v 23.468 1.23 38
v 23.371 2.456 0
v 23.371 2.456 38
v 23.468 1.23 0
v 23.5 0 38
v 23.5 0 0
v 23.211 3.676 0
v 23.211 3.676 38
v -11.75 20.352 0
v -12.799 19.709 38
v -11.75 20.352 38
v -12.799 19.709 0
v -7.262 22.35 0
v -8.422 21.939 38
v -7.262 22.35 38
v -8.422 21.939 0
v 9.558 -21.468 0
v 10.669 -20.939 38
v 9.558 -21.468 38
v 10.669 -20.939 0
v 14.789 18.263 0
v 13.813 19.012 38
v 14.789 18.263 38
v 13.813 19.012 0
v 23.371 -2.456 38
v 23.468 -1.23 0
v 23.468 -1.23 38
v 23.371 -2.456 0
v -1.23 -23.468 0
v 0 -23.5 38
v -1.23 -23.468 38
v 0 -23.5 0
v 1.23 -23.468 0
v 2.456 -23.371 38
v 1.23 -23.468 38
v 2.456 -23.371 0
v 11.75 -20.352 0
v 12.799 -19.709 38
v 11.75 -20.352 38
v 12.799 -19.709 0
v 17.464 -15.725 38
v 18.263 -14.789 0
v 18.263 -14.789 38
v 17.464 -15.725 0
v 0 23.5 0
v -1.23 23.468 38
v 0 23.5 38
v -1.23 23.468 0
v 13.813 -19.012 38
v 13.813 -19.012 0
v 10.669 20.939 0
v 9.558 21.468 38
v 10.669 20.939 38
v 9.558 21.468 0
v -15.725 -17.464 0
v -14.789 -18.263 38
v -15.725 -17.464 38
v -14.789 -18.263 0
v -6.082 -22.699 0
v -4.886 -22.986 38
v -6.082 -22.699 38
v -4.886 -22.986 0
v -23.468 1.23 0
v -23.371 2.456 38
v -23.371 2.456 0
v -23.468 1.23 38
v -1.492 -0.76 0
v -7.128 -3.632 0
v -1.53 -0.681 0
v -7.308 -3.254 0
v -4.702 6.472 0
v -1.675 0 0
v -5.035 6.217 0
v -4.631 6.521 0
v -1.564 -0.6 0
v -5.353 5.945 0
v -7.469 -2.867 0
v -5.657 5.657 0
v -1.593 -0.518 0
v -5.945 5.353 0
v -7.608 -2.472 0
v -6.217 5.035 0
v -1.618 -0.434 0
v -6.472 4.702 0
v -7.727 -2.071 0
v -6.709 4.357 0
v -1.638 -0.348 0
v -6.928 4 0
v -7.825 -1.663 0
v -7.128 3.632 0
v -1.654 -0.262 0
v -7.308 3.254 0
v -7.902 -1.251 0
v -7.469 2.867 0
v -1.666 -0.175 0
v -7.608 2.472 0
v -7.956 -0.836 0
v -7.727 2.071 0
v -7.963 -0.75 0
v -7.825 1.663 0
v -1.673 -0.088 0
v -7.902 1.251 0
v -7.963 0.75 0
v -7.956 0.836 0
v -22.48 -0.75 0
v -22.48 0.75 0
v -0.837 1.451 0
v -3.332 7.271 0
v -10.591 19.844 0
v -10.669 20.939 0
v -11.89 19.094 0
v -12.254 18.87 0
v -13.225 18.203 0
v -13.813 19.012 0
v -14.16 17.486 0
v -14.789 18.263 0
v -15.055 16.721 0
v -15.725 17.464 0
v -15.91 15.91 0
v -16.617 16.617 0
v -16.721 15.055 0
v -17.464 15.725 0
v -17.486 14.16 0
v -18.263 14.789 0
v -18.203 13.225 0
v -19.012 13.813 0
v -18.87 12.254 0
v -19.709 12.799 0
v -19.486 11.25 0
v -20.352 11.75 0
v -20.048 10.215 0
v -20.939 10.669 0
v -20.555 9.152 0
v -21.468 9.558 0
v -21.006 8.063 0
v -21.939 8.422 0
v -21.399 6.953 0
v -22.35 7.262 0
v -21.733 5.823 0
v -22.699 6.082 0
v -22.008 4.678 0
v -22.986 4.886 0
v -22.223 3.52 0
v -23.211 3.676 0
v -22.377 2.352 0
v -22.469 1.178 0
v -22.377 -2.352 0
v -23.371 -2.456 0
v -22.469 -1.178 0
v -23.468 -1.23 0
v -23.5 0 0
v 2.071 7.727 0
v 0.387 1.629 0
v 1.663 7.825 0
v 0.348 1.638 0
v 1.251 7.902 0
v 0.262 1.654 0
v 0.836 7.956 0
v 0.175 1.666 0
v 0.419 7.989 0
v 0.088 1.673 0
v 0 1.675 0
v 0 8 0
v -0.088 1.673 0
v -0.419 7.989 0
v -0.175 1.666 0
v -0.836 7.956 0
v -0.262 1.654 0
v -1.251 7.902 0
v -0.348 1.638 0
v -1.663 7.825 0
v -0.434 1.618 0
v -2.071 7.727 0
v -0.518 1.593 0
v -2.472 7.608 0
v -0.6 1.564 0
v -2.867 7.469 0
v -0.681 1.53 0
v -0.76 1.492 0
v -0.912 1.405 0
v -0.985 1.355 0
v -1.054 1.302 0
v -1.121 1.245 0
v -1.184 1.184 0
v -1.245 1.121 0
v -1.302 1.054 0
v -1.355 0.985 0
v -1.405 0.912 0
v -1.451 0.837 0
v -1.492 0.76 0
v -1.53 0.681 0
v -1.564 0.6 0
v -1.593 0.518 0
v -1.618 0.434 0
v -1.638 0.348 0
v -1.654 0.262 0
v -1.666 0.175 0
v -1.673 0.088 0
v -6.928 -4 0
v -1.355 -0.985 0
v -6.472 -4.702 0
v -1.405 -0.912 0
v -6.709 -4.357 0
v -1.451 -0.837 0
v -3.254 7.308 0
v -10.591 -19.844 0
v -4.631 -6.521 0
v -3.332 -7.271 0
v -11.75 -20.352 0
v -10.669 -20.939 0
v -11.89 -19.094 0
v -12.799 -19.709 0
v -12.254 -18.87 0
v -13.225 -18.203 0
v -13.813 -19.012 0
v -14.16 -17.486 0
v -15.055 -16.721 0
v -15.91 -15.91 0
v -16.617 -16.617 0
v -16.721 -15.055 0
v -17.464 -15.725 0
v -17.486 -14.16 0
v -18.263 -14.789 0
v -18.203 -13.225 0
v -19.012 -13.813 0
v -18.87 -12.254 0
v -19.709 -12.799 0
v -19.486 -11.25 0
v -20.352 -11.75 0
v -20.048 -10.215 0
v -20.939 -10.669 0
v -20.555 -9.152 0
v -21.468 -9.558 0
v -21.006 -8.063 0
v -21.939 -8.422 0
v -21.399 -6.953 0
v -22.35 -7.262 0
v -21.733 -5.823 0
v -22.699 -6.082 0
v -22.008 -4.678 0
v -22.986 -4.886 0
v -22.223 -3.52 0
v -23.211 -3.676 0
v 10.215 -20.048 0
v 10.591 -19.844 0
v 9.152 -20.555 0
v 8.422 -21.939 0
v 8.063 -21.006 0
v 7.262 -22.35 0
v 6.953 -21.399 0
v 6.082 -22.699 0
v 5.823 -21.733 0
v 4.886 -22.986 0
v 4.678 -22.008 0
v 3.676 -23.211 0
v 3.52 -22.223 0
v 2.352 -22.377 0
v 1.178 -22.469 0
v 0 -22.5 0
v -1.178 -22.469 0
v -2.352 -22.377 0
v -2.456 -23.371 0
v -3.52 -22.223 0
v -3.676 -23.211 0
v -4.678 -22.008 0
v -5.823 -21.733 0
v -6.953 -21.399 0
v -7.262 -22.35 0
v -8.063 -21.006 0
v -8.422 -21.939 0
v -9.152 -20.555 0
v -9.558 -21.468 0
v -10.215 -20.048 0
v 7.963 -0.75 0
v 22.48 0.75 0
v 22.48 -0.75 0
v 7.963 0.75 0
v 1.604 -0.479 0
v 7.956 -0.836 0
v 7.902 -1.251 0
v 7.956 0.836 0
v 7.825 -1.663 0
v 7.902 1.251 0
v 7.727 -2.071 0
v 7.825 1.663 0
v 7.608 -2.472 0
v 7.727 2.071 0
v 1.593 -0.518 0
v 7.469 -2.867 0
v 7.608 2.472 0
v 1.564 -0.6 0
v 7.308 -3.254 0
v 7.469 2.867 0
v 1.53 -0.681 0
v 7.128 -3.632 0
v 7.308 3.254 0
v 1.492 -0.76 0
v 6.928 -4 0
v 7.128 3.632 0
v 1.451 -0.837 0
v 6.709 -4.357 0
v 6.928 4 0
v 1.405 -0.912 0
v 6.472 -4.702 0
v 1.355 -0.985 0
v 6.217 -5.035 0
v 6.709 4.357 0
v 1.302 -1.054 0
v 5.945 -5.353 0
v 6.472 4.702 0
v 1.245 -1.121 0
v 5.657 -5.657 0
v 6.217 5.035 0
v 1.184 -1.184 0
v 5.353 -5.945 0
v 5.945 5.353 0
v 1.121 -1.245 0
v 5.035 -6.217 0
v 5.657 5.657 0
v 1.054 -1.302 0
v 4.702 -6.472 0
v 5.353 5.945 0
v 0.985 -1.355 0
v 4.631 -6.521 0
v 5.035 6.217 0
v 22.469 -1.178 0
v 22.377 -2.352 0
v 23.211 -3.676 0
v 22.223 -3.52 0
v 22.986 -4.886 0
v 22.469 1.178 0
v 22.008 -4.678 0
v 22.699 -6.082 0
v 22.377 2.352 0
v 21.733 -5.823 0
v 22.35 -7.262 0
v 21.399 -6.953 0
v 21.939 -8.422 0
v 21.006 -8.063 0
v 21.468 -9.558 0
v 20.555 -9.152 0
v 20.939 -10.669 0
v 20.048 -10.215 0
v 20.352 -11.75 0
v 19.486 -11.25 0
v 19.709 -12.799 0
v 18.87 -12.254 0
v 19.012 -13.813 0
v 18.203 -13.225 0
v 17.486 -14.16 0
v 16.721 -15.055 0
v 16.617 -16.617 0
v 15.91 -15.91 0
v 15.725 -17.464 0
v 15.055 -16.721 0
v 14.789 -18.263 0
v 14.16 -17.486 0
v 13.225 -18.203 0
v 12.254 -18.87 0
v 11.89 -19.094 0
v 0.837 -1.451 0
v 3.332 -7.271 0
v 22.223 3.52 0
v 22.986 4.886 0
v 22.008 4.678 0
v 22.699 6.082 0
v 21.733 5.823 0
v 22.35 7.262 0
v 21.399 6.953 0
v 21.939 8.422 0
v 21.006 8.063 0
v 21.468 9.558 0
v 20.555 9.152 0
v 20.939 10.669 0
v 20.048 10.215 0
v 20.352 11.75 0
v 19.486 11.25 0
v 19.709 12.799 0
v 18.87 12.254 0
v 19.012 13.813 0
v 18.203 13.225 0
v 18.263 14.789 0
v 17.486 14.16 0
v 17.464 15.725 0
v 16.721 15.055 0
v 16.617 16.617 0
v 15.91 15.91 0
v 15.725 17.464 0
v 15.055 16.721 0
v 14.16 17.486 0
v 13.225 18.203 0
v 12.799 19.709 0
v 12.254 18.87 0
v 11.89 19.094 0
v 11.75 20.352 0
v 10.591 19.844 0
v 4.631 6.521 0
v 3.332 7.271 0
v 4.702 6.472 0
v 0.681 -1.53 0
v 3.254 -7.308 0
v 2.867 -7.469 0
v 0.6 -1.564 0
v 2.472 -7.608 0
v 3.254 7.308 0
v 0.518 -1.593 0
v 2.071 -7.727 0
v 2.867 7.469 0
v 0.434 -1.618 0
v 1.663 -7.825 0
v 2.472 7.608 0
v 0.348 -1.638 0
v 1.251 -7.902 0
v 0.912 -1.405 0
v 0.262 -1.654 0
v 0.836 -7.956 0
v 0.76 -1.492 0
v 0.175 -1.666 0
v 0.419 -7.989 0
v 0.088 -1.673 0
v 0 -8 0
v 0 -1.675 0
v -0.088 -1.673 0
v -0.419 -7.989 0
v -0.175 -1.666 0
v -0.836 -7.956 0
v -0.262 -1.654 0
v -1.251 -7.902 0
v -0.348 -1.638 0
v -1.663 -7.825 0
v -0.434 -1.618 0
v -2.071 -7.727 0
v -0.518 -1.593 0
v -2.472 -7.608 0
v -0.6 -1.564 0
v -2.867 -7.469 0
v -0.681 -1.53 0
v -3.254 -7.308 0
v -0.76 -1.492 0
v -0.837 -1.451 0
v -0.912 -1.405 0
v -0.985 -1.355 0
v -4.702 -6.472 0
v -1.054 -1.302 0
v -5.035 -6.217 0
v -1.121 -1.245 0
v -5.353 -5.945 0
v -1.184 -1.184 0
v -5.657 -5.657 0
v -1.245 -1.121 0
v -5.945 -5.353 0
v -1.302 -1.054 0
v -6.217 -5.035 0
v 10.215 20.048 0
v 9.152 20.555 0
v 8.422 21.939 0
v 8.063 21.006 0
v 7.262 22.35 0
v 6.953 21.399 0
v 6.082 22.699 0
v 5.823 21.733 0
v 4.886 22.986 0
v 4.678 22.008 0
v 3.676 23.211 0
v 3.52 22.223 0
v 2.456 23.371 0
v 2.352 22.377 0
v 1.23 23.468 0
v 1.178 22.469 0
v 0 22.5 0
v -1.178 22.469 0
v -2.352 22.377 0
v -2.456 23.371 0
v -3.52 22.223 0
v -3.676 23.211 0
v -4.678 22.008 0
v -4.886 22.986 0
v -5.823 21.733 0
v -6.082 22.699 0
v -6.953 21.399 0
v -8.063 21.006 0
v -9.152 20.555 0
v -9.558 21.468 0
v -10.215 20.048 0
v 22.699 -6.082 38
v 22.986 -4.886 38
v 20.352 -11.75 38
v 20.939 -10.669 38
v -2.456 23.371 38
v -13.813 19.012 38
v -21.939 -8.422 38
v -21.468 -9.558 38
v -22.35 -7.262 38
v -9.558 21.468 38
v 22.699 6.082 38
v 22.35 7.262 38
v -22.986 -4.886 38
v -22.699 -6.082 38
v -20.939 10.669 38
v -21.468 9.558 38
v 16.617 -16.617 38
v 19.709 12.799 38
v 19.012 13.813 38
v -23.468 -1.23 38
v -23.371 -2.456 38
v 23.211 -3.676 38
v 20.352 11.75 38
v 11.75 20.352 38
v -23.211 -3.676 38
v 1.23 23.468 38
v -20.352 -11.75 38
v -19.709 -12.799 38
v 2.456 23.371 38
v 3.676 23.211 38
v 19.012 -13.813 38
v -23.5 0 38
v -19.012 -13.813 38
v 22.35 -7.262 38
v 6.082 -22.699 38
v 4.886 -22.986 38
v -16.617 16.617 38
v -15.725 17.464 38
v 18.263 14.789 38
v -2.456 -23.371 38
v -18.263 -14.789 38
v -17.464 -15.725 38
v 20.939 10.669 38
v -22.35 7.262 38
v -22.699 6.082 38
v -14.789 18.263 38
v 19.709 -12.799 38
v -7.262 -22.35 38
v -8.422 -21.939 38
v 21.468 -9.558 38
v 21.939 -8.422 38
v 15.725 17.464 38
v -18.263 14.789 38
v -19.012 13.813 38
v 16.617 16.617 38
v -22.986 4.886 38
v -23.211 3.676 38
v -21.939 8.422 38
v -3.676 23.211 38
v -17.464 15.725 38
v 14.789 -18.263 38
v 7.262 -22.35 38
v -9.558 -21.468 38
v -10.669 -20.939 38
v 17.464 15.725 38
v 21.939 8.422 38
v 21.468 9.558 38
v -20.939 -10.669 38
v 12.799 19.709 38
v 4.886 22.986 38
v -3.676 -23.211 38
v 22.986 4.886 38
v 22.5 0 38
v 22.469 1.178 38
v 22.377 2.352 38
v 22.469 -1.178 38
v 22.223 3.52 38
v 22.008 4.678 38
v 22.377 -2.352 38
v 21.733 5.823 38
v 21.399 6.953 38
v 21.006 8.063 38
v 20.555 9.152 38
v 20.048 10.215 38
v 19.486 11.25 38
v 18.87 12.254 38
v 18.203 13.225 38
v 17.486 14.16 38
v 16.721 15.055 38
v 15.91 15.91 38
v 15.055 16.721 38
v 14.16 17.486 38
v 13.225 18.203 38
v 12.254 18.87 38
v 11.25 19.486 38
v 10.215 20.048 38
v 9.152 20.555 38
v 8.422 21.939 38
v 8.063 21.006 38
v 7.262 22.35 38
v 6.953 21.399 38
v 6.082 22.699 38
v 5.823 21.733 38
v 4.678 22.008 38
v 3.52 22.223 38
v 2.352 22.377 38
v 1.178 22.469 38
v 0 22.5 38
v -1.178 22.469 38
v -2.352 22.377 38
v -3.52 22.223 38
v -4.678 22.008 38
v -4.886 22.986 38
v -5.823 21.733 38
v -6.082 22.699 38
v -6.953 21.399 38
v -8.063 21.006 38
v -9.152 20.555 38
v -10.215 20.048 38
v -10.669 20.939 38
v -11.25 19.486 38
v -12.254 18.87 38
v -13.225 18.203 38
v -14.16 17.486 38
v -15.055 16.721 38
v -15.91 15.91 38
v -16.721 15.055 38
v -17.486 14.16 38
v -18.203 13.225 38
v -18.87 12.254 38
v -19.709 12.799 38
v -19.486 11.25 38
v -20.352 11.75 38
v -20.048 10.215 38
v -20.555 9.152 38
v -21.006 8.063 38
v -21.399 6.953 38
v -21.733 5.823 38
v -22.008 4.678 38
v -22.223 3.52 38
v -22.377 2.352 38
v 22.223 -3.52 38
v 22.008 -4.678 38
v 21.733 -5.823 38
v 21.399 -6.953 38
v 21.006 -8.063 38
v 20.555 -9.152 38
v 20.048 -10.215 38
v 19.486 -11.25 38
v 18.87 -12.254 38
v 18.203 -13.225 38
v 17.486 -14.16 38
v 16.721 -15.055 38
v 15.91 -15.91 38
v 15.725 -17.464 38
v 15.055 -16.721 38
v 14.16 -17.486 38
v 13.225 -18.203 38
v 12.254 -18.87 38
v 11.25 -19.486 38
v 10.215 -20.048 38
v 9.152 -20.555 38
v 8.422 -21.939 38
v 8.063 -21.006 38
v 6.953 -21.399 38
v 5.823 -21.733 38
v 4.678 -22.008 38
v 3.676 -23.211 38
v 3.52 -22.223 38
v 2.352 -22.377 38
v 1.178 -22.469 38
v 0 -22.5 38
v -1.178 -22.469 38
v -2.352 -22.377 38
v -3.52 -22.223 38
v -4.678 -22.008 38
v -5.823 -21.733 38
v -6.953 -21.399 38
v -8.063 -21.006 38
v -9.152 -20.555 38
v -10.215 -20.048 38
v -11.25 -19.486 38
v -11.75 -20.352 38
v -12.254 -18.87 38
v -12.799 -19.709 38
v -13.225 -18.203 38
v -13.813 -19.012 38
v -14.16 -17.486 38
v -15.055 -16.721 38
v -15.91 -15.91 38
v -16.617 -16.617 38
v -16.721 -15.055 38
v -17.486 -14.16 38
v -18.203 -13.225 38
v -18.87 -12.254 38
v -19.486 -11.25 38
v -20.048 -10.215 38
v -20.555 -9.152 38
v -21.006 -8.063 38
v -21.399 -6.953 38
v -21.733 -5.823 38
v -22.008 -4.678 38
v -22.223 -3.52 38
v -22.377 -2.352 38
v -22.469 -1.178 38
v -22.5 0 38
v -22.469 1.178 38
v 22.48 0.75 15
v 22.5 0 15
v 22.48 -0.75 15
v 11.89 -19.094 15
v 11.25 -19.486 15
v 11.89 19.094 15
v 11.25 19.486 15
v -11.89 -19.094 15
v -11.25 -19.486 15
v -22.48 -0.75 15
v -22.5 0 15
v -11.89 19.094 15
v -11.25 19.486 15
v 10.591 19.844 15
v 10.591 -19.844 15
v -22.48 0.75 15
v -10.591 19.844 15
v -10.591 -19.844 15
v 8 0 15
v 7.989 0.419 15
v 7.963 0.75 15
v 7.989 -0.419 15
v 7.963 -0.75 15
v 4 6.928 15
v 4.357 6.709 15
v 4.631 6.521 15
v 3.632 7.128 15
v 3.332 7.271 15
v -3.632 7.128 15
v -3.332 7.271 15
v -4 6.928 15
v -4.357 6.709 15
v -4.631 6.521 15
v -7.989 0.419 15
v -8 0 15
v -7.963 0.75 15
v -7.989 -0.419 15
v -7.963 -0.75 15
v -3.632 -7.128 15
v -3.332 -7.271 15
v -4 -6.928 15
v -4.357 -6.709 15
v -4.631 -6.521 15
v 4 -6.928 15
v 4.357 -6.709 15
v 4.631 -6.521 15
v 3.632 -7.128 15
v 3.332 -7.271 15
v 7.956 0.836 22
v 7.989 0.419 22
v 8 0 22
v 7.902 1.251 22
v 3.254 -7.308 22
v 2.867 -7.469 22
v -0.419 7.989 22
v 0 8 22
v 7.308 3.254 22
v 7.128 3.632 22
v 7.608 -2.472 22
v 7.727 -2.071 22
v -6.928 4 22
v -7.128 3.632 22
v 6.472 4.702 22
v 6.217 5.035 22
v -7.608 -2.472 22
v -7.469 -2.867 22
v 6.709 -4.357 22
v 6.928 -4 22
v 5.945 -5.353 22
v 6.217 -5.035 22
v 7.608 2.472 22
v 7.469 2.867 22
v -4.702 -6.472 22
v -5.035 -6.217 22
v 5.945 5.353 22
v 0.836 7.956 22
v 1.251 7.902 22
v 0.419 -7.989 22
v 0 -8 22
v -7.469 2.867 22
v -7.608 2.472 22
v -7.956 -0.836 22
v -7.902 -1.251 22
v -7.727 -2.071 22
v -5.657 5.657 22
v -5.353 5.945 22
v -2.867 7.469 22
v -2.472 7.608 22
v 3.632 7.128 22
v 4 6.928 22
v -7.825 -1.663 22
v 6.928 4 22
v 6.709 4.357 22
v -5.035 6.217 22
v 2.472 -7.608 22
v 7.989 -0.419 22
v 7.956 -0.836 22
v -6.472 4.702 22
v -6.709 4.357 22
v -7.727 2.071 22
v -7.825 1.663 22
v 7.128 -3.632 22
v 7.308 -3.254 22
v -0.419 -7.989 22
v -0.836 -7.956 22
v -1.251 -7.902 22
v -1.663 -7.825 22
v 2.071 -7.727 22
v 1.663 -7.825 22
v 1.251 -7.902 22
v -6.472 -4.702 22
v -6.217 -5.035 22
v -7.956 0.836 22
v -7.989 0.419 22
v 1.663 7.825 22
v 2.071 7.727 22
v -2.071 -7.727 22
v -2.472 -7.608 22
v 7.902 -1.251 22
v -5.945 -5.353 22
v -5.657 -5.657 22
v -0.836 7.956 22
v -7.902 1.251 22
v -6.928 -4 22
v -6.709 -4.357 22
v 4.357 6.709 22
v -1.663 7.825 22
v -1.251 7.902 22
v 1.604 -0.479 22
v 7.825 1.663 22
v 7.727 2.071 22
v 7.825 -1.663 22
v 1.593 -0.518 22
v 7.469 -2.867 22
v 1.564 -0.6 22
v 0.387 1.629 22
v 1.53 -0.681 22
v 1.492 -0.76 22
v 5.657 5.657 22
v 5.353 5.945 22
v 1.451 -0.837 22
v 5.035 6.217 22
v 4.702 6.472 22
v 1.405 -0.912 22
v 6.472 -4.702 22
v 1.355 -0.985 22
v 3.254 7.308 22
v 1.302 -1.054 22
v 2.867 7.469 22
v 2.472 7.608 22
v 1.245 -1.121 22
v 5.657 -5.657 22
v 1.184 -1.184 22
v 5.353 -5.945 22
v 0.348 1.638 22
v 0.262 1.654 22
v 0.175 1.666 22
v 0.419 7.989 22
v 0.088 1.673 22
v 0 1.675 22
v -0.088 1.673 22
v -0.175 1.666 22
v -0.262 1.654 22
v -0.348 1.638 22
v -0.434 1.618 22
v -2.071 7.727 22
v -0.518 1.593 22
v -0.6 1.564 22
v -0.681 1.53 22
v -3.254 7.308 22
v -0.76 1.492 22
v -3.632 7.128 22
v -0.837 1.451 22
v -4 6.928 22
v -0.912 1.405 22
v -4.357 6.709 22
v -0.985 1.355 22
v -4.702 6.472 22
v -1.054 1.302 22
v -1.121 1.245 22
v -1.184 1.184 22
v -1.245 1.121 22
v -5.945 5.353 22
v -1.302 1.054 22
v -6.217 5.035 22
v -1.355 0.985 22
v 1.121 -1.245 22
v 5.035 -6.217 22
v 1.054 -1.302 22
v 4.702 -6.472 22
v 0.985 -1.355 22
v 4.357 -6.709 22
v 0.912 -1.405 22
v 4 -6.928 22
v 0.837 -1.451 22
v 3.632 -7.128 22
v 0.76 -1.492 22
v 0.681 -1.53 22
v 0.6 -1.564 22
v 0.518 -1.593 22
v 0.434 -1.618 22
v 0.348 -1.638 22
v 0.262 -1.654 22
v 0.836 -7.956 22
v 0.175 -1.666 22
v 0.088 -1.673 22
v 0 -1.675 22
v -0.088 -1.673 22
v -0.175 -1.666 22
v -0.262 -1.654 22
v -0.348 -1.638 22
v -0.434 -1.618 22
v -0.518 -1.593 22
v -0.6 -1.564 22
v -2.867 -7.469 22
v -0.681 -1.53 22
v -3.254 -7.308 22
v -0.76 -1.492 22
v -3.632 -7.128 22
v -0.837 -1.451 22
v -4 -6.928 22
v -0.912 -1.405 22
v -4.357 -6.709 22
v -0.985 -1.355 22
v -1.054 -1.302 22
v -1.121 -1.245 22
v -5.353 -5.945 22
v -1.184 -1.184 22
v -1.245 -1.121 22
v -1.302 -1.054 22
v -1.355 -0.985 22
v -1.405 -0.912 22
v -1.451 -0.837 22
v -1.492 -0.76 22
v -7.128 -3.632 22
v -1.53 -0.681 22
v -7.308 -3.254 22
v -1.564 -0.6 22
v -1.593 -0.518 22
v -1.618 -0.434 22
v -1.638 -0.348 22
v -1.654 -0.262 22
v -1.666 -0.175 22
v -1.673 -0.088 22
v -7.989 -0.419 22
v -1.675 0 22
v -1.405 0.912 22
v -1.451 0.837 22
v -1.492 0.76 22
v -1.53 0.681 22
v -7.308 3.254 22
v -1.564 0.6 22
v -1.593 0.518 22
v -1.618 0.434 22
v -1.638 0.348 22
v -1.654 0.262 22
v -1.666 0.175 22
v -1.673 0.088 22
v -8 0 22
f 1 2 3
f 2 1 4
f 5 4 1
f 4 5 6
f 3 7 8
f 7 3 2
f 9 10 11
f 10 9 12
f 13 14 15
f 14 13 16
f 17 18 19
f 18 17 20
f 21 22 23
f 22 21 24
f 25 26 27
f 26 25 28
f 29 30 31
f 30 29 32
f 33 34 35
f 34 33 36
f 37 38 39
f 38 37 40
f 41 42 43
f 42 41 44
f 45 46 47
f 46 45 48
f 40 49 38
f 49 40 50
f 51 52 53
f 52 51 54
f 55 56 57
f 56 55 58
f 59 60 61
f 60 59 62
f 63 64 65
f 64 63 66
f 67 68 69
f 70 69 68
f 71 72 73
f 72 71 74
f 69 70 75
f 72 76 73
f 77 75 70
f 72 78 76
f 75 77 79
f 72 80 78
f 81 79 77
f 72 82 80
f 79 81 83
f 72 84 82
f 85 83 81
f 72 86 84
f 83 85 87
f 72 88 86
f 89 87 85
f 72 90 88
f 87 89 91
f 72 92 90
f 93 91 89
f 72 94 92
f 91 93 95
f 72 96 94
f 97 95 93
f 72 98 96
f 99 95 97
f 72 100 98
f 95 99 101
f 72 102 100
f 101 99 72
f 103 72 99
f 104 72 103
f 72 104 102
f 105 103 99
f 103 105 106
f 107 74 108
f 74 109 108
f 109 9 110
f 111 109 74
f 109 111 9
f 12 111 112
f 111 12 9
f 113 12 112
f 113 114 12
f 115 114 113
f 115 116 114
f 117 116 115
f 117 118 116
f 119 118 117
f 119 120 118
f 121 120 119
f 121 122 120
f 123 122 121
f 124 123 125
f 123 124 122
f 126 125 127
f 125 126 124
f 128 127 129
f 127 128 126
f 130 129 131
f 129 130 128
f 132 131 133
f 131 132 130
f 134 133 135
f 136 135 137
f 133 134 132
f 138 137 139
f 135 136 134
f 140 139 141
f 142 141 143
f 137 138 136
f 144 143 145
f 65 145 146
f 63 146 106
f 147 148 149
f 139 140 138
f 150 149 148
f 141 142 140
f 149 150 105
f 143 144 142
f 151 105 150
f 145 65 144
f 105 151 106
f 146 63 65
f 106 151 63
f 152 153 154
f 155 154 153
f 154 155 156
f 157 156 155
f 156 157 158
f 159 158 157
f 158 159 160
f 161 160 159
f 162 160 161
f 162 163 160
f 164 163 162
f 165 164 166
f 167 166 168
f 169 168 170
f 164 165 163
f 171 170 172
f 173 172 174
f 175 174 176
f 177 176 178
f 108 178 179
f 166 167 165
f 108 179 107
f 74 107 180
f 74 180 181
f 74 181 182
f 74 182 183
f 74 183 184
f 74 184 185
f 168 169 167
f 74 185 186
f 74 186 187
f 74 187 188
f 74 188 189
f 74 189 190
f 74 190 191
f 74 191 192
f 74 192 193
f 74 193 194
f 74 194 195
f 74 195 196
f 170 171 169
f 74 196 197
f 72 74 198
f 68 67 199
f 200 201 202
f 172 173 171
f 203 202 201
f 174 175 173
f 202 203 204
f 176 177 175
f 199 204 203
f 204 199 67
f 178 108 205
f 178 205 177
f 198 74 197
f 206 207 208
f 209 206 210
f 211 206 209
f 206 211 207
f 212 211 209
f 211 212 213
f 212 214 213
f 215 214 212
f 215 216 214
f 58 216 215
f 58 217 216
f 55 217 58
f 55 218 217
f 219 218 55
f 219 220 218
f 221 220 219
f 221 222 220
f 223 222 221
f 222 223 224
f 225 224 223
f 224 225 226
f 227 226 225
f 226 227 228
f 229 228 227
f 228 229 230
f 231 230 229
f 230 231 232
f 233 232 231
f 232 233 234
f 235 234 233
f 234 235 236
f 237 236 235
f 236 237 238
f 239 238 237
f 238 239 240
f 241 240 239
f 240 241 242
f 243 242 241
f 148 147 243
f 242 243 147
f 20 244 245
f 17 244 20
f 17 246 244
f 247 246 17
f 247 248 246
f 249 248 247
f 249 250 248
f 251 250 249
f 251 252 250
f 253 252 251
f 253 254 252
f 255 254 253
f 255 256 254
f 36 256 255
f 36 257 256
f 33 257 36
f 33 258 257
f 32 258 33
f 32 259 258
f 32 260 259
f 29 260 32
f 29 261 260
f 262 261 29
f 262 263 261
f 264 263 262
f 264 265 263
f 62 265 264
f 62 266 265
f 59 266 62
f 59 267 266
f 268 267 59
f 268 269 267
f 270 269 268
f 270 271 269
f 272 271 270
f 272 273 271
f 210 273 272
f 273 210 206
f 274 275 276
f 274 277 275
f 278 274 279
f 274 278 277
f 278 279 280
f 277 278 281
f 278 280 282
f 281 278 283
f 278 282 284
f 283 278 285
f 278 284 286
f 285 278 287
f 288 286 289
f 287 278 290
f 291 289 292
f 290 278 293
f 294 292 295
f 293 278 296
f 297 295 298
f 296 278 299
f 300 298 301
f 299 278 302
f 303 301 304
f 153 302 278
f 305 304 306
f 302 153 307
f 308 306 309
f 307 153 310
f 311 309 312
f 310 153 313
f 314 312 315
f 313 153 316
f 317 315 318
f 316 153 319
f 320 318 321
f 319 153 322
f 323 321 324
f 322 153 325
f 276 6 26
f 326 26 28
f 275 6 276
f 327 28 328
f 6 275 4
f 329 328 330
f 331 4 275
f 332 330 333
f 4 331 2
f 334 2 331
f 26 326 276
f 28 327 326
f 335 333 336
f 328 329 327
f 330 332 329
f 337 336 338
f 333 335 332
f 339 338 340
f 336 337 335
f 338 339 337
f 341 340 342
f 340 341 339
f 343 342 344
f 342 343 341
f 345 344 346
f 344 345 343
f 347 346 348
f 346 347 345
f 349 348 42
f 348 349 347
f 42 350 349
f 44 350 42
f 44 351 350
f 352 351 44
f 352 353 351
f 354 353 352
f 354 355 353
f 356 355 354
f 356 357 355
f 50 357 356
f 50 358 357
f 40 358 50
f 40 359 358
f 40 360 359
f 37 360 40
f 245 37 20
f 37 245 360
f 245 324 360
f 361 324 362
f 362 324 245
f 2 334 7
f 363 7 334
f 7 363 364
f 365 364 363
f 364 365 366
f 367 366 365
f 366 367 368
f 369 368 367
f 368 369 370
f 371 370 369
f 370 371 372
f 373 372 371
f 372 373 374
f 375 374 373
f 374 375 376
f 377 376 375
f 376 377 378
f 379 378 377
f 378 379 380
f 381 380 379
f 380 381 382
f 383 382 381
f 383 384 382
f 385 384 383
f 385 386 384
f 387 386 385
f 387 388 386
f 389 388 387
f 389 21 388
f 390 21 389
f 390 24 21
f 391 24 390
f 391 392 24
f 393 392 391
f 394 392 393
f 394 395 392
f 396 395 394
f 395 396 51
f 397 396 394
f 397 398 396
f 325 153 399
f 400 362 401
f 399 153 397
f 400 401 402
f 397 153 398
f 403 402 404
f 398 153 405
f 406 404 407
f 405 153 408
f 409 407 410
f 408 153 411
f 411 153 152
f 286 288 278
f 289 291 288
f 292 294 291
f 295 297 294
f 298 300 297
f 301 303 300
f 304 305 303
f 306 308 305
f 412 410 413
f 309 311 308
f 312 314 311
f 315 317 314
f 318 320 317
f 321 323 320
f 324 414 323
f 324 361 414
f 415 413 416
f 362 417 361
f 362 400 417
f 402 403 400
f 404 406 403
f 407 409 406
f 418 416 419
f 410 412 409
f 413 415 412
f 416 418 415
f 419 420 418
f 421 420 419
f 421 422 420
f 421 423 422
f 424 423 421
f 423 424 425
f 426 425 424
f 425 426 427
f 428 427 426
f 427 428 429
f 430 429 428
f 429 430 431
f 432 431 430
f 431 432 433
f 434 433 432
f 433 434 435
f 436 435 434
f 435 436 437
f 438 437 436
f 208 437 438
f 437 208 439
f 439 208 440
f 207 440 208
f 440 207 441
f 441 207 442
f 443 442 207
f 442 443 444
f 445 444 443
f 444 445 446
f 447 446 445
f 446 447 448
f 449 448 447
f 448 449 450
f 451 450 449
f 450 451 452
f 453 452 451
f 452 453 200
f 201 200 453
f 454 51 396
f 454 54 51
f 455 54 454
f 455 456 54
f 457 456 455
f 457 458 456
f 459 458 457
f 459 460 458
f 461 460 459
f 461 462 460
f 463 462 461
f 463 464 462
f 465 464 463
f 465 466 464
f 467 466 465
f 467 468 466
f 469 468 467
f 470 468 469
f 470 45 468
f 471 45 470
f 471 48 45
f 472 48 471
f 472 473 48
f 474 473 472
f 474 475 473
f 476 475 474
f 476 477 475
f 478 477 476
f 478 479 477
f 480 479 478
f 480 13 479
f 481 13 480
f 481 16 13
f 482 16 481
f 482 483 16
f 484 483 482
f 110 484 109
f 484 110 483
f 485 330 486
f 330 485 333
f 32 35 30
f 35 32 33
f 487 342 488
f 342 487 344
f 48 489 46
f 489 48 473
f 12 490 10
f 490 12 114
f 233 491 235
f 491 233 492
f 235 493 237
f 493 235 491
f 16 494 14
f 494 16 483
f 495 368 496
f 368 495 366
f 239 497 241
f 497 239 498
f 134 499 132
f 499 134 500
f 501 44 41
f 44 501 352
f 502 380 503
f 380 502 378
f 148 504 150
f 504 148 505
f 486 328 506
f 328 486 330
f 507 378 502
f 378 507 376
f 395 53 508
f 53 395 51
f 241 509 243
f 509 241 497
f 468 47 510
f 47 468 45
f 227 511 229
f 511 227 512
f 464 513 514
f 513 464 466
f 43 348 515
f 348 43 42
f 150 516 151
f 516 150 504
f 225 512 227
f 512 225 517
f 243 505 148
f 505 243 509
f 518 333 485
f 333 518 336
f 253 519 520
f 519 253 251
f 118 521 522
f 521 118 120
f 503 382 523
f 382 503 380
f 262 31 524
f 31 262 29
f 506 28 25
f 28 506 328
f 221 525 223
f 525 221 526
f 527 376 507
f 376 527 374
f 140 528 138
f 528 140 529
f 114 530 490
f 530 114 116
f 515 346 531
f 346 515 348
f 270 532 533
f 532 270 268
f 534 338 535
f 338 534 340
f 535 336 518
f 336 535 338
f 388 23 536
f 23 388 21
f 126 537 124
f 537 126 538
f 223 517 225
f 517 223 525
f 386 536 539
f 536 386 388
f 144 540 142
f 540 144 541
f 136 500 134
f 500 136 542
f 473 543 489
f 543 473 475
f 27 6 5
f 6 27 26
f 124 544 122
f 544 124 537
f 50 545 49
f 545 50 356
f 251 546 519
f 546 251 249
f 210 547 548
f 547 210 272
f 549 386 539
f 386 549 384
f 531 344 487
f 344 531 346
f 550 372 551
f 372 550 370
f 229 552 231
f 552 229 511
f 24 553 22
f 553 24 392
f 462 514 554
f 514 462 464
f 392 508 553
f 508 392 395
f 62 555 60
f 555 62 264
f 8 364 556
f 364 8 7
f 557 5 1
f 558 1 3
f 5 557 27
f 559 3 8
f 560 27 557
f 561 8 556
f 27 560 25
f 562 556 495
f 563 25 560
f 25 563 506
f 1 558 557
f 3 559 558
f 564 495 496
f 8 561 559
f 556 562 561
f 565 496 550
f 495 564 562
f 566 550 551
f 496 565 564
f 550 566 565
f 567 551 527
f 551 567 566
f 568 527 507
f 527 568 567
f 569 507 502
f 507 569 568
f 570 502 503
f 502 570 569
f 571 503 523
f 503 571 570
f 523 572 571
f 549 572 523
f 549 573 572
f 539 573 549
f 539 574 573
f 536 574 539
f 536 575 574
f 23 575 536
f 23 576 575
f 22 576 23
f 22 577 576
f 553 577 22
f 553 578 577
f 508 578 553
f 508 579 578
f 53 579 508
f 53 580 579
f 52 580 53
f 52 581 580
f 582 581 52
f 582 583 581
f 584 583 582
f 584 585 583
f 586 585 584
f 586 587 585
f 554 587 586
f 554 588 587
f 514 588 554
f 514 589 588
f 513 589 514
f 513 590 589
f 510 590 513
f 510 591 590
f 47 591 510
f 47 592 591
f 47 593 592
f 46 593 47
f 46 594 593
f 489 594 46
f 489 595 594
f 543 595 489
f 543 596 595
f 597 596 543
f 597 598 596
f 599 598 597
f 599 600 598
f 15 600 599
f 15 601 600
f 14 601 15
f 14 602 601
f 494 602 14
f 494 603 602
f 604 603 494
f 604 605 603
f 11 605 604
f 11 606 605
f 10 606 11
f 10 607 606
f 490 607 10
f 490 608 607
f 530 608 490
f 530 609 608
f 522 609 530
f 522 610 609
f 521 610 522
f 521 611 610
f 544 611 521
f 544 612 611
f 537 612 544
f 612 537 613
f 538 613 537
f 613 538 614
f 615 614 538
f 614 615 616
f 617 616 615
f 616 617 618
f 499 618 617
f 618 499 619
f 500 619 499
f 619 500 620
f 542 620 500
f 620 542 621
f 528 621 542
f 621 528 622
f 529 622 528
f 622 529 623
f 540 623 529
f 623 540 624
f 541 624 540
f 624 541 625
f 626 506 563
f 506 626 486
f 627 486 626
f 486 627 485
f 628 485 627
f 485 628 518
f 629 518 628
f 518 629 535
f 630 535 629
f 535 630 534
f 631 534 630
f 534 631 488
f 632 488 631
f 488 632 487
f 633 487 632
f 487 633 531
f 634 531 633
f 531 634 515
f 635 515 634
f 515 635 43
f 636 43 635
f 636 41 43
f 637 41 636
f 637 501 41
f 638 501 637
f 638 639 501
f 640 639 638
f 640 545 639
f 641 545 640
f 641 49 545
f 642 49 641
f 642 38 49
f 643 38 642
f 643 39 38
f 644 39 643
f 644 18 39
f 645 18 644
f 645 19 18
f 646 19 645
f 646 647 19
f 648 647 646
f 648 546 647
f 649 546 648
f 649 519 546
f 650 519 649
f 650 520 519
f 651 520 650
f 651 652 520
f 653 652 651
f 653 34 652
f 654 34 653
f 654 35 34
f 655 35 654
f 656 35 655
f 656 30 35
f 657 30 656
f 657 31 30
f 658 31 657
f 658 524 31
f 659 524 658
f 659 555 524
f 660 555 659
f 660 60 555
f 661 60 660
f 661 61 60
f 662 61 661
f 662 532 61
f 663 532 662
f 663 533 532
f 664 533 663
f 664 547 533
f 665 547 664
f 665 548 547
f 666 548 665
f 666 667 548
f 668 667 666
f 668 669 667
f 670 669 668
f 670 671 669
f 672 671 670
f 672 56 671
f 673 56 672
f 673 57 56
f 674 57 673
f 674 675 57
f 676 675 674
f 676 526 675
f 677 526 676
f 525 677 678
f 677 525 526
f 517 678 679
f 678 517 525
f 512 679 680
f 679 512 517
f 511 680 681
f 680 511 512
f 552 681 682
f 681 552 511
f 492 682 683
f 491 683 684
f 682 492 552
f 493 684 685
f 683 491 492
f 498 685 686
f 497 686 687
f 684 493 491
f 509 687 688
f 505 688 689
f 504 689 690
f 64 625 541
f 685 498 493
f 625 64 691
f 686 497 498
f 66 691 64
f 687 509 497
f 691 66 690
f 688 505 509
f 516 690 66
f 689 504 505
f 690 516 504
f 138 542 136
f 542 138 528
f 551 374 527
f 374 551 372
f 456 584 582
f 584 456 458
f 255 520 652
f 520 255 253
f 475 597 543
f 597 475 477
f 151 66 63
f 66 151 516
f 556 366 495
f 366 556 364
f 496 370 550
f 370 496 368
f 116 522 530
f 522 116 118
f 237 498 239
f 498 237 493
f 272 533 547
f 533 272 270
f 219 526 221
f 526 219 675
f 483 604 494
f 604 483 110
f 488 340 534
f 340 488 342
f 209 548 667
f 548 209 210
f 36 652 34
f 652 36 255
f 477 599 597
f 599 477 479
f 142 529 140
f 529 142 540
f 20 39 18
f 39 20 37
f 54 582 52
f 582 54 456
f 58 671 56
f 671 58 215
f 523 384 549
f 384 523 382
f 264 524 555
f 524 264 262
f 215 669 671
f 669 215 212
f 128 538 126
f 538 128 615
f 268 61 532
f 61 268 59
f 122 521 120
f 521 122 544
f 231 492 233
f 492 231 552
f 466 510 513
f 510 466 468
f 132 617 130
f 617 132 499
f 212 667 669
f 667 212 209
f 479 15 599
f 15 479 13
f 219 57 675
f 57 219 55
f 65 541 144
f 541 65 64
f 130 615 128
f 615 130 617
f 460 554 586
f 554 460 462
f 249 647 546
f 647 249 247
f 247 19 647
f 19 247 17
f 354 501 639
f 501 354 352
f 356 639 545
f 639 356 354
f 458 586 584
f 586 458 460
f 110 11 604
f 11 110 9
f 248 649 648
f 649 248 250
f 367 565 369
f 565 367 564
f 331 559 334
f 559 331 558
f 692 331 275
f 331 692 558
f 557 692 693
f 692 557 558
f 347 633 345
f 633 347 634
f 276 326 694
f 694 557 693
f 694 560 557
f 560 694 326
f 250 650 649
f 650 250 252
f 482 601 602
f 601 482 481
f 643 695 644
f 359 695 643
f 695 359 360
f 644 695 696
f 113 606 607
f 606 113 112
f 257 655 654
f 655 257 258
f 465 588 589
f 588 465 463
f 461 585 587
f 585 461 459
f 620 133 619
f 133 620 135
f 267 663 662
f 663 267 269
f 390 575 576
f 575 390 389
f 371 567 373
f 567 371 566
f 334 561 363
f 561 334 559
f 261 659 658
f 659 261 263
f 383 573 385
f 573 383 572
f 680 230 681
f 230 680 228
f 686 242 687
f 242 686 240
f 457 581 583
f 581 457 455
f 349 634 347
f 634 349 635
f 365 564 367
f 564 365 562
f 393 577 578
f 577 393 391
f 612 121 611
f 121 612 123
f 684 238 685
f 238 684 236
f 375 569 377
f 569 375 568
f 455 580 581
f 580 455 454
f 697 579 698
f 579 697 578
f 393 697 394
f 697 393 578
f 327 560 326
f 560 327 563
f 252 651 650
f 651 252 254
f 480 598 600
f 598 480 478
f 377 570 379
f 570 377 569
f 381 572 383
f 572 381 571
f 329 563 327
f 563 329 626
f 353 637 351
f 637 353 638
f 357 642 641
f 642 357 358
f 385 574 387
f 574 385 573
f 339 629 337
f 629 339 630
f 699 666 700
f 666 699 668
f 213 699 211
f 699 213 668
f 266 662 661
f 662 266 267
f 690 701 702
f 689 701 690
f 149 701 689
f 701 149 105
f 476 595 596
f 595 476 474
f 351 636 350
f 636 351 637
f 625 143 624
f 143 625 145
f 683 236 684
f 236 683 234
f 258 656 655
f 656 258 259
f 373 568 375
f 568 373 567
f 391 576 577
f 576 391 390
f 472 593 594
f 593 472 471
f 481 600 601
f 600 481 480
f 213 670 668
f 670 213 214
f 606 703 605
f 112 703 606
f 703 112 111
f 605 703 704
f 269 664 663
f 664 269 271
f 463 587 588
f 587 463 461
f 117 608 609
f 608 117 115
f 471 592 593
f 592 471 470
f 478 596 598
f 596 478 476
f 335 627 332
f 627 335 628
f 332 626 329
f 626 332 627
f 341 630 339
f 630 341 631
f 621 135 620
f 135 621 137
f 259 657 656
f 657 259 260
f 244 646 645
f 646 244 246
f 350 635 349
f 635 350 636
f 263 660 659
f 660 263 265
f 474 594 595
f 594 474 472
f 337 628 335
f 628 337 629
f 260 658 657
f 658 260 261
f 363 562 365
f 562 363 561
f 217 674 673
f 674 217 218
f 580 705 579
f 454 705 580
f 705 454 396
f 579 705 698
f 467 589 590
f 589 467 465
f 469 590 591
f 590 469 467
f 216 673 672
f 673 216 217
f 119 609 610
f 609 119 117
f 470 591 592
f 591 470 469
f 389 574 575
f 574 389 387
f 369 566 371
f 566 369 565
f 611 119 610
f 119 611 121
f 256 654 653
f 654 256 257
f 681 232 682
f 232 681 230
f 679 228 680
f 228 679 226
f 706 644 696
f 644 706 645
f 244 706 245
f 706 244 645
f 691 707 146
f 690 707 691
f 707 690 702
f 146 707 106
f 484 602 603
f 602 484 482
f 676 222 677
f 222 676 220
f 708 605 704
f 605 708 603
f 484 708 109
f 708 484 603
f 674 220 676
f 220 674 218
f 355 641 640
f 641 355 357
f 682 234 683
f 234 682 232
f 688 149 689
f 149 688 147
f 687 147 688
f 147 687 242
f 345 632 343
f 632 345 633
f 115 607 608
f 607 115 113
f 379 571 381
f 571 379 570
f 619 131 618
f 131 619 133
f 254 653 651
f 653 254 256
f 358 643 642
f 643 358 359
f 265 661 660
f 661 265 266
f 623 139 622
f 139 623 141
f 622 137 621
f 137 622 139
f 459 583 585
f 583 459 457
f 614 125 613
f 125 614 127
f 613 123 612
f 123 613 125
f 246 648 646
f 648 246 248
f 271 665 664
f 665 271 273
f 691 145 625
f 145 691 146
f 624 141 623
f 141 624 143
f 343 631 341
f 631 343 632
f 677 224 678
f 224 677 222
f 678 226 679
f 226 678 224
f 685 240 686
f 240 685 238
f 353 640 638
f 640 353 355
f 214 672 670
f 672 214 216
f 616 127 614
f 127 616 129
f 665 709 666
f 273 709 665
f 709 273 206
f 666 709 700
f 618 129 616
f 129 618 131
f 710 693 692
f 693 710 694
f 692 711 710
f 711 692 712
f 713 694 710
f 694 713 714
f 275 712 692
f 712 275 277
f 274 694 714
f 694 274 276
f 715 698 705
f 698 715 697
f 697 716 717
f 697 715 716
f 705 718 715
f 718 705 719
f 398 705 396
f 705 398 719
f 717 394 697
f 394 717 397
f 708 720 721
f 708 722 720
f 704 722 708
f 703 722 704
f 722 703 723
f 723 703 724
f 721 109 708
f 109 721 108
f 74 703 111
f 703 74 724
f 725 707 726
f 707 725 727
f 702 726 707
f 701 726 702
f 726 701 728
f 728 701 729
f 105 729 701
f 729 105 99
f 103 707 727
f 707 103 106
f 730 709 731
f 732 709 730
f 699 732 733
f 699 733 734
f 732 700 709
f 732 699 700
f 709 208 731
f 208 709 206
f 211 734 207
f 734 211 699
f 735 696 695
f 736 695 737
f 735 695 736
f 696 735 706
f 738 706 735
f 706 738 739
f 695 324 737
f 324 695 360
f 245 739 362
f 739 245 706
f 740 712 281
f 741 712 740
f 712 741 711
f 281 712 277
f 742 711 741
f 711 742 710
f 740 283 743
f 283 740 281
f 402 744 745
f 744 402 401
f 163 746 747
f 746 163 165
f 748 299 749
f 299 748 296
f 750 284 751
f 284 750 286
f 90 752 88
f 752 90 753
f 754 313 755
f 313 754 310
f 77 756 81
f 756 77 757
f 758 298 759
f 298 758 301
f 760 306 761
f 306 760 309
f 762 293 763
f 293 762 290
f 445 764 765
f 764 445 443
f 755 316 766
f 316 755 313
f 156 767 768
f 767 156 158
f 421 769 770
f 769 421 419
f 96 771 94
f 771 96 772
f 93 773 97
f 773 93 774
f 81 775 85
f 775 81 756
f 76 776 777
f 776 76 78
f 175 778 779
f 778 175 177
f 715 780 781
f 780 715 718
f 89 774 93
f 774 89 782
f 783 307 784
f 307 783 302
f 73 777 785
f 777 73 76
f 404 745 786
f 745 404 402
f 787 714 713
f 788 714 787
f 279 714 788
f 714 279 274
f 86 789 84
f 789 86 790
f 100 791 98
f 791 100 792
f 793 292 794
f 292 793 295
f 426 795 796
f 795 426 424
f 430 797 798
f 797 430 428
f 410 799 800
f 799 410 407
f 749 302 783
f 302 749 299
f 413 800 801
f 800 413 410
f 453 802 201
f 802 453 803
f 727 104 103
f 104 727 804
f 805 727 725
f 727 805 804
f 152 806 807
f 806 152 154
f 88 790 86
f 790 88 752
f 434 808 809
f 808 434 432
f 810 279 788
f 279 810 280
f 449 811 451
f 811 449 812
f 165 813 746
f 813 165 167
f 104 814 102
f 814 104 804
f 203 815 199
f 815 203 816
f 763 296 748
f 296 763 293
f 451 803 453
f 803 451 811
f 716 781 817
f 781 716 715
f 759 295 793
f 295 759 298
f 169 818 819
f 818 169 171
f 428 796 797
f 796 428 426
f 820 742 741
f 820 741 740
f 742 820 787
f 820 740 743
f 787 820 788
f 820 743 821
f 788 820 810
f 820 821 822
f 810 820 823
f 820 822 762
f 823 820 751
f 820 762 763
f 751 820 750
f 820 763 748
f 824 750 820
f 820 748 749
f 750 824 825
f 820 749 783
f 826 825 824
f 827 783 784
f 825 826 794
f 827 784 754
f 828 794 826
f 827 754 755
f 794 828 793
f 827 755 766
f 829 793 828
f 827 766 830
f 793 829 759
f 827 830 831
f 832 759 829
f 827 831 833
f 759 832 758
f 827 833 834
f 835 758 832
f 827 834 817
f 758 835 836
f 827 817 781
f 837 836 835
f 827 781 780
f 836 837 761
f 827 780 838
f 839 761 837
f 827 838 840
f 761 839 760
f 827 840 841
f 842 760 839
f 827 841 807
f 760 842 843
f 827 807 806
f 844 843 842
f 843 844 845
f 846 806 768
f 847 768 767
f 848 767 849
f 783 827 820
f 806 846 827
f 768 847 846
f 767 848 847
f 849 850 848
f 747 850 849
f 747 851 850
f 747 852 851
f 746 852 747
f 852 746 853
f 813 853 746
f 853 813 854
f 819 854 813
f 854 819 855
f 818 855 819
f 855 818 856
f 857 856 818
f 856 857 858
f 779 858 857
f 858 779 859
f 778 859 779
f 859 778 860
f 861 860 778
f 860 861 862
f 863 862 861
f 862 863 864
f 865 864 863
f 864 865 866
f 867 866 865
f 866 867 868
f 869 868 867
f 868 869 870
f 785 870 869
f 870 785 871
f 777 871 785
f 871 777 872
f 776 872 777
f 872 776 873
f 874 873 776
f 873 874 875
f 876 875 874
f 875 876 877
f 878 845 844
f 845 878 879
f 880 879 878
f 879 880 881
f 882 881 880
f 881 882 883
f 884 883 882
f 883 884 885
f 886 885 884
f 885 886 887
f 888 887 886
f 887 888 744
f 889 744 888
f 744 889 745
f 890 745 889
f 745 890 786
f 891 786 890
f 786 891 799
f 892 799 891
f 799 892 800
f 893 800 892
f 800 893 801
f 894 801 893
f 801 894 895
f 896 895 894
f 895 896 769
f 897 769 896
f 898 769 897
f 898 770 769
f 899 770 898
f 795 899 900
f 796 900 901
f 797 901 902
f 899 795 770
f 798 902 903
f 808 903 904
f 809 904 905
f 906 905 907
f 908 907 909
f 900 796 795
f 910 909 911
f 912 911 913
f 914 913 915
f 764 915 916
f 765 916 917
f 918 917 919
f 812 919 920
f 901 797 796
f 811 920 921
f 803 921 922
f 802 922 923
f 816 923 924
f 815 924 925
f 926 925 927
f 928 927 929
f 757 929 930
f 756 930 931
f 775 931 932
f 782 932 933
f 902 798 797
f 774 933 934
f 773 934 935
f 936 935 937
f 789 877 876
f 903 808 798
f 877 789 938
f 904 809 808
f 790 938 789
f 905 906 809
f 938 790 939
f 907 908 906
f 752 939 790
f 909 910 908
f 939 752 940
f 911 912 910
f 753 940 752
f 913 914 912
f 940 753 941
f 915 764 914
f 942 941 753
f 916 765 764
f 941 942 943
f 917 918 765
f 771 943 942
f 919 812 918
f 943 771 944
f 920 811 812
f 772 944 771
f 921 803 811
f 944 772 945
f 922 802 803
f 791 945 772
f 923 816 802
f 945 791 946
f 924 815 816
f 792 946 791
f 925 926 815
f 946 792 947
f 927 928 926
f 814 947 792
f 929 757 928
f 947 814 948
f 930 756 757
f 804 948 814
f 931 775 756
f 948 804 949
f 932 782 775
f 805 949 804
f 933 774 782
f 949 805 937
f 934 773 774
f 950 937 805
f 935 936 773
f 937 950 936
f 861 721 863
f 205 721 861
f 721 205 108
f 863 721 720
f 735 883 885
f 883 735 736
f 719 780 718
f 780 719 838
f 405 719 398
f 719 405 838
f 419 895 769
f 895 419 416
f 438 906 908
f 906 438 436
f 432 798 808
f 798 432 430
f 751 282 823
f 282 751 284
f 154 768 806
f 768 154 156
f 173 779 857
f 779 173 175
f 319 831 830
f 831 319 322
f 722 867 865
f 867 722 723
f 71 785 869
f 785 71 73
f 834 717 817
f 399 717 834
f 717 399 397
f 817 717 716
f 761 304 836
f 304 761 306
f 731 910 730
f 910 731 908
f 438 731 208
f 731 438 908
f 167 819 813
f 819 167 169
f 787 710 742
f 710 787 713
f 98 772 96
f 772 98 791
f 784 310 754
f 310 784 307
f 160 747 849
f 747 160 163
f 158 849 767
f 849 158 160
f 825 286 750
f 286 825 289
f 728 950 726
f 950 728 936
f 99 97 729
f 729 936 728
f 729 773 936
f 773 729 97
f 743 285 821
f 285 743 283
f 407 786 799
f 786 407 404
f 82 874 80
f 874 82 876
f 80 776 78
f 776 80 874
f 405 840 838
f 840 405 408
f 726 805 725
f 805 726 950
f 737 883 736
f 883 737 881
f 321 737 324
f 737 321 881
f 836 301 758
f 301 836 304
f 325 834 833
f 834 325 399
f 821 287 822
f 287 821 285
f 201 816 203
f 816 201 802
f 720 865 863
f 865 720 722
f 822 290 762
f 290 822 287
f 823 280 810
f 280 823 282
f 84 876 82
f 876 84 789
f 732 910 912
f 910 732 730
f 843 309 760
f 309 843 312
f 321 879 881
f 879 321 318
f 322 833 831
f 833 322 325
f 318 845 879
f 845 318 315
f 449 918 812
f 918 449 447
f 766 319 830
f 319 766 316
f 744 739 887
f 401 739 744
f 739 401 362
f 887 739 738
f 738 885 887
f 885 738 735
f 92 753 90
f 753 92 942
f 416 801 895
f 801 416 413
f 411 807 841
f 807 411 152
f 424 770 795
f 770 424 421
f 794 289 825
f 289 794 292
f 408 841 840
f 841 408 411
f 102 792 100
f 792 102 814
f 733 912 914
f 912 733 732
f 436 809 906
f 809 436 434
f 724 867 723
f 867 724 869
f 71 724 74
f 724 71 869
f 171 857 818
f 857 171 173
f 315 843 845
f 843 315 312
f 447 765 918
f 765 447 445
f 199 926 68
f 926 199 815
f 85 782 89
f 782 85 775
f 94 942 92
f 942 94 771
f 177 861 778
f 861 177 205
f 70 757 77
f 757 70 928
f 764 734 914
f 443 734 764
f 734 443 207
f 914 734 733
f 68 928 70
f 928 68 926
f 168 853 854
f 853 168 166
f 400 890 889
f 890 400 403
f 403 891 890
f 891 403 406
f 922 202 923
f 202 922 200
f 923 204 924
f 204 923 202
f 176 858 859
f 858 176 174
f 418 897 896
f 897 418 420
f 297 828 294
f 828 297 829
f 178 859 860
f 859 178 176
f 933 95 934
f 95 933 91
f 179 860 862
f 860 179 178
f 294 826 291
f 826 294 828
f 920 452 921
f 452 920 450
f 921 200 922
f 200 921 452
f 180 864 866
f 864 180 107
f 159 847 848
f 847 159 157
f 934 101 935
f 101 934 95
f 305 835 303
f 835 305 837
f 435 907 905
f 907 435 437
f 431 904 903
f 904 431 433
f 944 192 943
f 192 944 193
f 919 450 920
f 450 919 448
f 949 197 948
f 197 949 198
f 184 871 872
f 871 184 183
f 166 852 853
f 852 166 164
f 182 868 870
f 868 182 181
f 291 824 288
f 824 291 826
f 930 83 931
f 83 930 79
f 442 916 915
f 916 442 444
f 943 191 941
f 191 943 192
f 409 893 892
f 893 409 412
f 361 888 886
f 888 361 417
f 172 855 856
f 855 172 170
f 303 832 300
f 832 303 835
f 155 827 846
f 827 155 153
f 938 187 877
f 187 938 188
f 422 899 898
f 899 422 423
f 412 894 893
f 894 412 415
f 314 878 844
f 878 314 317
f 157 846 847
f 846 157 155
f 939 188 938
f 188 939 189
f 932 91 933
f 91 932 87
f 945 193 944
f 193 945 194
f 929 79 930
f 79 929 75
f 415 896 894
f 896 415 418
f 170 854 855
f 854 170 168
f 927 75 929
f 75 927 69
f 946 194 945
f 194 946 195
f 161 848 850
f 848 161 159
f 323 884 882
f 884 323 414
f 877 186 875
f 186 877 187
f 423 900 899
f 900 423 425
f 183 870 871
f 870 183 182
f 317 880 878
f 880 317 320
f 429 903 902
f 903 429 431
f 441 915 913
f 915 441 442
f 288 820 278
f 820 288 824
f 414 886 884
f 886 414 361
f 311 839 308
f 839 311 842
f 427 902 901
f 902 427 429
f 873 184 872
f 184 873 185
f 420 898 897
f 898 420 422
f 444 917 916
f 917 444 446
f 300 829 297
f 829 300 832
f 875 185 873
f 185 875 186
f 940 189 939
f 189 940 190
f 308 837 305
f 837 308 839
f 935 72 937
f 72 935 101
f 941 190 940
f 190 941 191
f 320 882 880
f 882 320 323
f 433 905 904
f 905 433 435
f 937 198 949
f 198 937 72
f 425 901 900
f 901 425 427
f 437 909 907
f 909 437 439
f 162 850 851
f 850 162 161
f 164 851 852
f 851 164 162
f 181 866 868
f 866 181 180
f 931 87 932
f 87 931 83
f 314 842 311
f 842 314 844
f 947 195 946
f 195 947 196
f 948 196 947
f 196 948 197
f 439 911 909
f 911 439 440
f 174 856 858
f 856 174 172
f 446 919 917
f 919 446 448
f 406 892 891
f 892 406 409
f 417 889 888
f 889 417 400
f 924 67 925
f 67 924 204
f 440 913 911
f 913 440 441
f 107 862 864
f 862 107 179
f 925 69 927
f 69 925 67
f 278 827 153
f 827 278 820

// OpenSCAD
$fn=120;
difference(){
cylinder(d=47,h=38);
translate([0,0,-1])cylinder(d=45,h=40);
}
difference(){
union()
{
for(i=[0:60:300])
{
    rotate([0,0,i])translate([3,-0.75,0])
    cube(size=[20,1.5,15]);
} 
cylinder(d=16,h=22);
}
translate([0,0,-1])cylinder(d=3.35,h=24);
}
rotate([0,0,30])translate([1.15,-2,0])
cube(size=[2,4,22]);
